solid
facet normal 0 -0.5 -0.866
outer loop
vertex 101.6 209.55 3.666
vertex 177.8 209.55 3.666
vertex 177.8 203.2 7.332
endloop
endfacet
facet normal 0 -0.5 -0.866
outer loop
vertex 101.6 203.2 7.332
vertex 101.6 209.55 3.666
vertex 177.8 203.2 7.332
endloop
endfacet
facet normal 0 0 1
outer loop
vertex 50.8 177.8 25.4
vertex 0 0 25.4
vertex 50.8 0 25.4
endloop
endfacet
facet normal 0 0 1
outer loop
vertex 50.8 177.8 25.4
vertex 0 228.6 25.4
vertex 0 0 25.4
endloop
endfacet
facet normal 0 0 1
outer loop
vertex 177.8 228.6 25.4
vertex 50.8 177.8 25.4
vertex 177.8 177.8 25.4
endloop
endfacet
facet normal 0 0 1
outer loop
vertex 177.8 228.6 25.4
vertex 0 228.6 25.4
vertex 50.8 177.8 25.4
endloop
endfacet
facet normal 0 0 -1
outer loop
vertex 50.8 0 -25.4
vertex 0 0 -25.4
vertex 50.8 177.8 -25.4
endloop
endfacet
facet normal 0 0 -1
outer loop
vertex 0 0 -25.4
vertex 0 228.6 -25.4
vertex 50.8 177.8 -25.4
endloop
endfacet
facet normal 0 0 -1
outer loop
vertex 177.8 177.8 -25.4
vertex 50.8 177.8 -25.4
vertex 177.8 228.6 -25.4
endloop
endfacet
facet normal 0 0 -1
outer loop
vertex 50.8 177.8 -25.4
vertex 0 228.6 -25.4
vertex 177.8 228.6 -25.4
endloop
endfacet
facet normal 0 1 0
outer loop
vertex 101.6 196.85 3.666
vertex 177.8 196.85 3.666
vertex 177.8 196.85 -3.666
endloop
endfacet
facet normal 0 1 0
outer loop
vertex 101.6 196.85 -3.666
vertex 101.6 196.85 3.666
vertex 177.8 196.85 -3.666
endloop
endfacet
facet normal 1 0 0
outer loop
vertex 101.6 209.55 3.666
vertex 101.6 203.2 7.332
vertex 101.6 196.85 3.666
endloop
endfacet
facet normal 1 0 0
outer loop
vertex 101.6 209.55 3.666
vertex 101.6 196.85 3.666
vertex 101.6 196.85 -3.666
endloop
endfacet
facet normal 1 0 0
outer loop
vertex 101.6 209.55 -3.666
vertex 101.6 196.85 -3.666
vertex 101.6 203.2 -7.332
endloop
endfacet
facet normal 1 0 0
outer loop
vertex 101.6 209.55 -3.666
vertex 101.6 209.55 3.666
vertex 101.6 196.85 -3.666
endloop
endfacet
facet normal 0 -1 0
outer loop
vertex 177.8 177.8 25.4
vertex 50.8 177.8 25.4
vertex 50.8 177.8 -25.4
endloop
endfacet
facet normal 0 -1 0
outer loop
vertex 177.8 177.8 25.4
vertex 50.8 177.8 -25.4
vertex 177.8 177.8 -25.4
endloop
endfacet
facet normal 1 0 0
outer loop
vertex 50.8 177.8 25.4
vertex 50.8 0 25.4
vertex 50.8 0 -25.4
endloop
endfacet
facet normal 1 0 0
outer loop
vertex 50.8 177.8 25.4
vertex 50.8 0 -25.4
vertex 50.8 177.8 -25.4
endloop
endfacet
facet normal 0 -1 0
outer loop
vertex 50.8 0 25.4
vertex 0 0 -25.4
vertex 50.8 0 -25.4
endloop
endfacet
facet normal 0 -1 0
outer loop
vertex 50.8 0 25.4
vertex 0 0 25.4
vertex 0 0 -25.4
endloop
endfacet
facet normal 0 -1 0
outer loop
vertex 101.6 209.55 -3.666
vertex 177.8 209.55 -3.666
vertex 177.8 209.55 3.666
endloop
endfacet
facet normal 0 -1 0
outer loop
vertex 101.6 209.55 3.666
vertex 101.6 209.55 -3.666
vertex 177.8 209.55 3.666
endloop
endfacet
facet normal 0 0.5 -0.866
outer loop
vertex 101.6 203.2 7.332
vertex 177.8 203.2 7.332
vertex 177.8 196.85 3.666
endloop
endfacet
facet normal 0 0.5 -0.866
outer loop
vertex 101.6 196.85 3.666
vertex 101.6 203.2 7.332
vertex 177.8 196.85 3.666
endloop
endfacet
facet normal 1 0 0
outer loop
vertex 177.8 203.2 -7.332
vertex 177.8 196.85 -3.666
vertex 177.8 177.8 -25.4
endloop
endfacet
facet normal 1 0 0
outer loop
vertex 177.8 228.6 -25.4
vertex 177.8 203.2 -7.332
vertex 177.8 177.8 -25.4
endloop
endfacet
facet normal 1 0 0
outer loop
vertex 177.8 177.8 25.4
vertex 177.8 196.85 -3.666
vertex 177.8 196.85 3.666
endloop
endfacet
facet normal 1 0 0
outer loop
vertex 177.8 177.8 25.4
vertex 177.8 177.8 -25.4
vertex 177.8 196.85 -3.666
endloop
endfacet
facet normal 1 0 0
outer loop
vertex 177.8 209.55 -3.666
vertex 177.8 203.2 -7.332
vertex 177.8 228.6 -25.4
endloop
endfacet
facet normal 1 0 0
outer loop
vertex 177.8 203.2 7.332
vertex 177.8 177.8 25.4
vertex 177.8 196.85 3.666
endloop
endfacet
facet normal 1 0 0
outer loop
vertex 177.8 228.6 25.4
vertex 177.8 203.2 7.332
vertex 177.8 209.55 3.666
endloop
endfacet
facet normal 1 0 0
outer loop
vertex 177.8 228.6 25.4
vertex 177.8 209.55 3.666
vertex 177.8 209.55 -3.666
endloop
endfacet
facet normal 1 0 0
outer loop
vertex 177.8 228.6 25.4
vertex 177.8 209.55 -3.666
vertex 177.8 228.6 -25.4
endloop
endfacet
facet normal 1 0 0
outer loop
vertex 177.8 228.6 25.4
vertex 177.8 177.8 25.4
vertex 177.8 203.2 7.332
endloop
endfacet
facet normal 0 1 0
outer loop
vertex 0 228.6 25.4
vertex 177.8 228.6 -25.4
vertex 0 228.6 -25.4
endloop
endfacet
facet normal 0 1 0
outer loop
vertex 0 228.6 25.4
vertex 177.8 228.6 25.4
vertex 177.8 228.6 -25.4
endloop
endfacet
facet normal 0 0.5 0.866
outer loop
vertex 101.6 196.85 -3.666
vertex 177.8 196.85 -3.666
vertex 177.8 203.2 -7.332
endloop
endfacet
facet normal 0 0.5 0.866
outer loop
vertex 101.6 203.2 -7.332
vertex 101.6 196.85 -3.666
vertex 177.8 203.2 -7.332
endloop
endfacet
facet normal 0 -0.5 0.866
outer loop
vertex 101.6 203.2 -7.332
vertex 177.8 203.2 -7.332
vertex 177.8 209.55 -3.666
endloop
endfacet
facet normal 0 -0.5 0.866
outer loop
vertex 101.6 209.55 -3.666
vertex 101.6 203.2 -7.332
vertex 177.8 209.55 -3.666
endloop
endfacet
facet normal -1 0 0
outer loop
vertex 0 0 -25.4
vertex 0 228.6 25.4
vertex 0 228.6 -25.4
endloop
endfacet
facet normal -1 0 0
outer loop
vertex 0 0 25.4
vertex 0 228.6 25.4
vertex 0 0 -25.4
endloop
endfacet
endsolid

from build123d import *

# Parameters (mm, degrees)
BOSS_EXTRUDE1_DEPTH = 25.4
CUT_EXTRUDE1_DEPTH  = 76.2


with BuildPart() as part:
    # Sketch2 → Boss-Extrude1 (new, symmetric)
    with BuildSketch(Plane.XY):
        Polygon((0, 0), (50.8, 0), (50.8, 177.8), (177.8, 177.8), (177.8, 228.6), (50.8, 228.6), (0, 228.6), align=None)
    extrude(amount=BOSS_EXTRUDE1_DEPTH, both=True)

    # Sketch3 → Cut-Extrude1 (cut)
    with BuildSketch(Plane(origin=(177.8, 0, 0), x_dir=(0, 0, -1), z_dir=(1, 0, 0))):
        Polygon((7.332348419, 203.2), (3.666174209, 209.55), (-3.666174209, 209.55), (-7.332348419, 203.2), (-3.666174209, 196.85), (3.666174209, 196.85), align=None)
    extrude(amount=-CUT_EXTRUDE1_DEPTH, mode=Mode.SUBTRACT)


solid = part.part
